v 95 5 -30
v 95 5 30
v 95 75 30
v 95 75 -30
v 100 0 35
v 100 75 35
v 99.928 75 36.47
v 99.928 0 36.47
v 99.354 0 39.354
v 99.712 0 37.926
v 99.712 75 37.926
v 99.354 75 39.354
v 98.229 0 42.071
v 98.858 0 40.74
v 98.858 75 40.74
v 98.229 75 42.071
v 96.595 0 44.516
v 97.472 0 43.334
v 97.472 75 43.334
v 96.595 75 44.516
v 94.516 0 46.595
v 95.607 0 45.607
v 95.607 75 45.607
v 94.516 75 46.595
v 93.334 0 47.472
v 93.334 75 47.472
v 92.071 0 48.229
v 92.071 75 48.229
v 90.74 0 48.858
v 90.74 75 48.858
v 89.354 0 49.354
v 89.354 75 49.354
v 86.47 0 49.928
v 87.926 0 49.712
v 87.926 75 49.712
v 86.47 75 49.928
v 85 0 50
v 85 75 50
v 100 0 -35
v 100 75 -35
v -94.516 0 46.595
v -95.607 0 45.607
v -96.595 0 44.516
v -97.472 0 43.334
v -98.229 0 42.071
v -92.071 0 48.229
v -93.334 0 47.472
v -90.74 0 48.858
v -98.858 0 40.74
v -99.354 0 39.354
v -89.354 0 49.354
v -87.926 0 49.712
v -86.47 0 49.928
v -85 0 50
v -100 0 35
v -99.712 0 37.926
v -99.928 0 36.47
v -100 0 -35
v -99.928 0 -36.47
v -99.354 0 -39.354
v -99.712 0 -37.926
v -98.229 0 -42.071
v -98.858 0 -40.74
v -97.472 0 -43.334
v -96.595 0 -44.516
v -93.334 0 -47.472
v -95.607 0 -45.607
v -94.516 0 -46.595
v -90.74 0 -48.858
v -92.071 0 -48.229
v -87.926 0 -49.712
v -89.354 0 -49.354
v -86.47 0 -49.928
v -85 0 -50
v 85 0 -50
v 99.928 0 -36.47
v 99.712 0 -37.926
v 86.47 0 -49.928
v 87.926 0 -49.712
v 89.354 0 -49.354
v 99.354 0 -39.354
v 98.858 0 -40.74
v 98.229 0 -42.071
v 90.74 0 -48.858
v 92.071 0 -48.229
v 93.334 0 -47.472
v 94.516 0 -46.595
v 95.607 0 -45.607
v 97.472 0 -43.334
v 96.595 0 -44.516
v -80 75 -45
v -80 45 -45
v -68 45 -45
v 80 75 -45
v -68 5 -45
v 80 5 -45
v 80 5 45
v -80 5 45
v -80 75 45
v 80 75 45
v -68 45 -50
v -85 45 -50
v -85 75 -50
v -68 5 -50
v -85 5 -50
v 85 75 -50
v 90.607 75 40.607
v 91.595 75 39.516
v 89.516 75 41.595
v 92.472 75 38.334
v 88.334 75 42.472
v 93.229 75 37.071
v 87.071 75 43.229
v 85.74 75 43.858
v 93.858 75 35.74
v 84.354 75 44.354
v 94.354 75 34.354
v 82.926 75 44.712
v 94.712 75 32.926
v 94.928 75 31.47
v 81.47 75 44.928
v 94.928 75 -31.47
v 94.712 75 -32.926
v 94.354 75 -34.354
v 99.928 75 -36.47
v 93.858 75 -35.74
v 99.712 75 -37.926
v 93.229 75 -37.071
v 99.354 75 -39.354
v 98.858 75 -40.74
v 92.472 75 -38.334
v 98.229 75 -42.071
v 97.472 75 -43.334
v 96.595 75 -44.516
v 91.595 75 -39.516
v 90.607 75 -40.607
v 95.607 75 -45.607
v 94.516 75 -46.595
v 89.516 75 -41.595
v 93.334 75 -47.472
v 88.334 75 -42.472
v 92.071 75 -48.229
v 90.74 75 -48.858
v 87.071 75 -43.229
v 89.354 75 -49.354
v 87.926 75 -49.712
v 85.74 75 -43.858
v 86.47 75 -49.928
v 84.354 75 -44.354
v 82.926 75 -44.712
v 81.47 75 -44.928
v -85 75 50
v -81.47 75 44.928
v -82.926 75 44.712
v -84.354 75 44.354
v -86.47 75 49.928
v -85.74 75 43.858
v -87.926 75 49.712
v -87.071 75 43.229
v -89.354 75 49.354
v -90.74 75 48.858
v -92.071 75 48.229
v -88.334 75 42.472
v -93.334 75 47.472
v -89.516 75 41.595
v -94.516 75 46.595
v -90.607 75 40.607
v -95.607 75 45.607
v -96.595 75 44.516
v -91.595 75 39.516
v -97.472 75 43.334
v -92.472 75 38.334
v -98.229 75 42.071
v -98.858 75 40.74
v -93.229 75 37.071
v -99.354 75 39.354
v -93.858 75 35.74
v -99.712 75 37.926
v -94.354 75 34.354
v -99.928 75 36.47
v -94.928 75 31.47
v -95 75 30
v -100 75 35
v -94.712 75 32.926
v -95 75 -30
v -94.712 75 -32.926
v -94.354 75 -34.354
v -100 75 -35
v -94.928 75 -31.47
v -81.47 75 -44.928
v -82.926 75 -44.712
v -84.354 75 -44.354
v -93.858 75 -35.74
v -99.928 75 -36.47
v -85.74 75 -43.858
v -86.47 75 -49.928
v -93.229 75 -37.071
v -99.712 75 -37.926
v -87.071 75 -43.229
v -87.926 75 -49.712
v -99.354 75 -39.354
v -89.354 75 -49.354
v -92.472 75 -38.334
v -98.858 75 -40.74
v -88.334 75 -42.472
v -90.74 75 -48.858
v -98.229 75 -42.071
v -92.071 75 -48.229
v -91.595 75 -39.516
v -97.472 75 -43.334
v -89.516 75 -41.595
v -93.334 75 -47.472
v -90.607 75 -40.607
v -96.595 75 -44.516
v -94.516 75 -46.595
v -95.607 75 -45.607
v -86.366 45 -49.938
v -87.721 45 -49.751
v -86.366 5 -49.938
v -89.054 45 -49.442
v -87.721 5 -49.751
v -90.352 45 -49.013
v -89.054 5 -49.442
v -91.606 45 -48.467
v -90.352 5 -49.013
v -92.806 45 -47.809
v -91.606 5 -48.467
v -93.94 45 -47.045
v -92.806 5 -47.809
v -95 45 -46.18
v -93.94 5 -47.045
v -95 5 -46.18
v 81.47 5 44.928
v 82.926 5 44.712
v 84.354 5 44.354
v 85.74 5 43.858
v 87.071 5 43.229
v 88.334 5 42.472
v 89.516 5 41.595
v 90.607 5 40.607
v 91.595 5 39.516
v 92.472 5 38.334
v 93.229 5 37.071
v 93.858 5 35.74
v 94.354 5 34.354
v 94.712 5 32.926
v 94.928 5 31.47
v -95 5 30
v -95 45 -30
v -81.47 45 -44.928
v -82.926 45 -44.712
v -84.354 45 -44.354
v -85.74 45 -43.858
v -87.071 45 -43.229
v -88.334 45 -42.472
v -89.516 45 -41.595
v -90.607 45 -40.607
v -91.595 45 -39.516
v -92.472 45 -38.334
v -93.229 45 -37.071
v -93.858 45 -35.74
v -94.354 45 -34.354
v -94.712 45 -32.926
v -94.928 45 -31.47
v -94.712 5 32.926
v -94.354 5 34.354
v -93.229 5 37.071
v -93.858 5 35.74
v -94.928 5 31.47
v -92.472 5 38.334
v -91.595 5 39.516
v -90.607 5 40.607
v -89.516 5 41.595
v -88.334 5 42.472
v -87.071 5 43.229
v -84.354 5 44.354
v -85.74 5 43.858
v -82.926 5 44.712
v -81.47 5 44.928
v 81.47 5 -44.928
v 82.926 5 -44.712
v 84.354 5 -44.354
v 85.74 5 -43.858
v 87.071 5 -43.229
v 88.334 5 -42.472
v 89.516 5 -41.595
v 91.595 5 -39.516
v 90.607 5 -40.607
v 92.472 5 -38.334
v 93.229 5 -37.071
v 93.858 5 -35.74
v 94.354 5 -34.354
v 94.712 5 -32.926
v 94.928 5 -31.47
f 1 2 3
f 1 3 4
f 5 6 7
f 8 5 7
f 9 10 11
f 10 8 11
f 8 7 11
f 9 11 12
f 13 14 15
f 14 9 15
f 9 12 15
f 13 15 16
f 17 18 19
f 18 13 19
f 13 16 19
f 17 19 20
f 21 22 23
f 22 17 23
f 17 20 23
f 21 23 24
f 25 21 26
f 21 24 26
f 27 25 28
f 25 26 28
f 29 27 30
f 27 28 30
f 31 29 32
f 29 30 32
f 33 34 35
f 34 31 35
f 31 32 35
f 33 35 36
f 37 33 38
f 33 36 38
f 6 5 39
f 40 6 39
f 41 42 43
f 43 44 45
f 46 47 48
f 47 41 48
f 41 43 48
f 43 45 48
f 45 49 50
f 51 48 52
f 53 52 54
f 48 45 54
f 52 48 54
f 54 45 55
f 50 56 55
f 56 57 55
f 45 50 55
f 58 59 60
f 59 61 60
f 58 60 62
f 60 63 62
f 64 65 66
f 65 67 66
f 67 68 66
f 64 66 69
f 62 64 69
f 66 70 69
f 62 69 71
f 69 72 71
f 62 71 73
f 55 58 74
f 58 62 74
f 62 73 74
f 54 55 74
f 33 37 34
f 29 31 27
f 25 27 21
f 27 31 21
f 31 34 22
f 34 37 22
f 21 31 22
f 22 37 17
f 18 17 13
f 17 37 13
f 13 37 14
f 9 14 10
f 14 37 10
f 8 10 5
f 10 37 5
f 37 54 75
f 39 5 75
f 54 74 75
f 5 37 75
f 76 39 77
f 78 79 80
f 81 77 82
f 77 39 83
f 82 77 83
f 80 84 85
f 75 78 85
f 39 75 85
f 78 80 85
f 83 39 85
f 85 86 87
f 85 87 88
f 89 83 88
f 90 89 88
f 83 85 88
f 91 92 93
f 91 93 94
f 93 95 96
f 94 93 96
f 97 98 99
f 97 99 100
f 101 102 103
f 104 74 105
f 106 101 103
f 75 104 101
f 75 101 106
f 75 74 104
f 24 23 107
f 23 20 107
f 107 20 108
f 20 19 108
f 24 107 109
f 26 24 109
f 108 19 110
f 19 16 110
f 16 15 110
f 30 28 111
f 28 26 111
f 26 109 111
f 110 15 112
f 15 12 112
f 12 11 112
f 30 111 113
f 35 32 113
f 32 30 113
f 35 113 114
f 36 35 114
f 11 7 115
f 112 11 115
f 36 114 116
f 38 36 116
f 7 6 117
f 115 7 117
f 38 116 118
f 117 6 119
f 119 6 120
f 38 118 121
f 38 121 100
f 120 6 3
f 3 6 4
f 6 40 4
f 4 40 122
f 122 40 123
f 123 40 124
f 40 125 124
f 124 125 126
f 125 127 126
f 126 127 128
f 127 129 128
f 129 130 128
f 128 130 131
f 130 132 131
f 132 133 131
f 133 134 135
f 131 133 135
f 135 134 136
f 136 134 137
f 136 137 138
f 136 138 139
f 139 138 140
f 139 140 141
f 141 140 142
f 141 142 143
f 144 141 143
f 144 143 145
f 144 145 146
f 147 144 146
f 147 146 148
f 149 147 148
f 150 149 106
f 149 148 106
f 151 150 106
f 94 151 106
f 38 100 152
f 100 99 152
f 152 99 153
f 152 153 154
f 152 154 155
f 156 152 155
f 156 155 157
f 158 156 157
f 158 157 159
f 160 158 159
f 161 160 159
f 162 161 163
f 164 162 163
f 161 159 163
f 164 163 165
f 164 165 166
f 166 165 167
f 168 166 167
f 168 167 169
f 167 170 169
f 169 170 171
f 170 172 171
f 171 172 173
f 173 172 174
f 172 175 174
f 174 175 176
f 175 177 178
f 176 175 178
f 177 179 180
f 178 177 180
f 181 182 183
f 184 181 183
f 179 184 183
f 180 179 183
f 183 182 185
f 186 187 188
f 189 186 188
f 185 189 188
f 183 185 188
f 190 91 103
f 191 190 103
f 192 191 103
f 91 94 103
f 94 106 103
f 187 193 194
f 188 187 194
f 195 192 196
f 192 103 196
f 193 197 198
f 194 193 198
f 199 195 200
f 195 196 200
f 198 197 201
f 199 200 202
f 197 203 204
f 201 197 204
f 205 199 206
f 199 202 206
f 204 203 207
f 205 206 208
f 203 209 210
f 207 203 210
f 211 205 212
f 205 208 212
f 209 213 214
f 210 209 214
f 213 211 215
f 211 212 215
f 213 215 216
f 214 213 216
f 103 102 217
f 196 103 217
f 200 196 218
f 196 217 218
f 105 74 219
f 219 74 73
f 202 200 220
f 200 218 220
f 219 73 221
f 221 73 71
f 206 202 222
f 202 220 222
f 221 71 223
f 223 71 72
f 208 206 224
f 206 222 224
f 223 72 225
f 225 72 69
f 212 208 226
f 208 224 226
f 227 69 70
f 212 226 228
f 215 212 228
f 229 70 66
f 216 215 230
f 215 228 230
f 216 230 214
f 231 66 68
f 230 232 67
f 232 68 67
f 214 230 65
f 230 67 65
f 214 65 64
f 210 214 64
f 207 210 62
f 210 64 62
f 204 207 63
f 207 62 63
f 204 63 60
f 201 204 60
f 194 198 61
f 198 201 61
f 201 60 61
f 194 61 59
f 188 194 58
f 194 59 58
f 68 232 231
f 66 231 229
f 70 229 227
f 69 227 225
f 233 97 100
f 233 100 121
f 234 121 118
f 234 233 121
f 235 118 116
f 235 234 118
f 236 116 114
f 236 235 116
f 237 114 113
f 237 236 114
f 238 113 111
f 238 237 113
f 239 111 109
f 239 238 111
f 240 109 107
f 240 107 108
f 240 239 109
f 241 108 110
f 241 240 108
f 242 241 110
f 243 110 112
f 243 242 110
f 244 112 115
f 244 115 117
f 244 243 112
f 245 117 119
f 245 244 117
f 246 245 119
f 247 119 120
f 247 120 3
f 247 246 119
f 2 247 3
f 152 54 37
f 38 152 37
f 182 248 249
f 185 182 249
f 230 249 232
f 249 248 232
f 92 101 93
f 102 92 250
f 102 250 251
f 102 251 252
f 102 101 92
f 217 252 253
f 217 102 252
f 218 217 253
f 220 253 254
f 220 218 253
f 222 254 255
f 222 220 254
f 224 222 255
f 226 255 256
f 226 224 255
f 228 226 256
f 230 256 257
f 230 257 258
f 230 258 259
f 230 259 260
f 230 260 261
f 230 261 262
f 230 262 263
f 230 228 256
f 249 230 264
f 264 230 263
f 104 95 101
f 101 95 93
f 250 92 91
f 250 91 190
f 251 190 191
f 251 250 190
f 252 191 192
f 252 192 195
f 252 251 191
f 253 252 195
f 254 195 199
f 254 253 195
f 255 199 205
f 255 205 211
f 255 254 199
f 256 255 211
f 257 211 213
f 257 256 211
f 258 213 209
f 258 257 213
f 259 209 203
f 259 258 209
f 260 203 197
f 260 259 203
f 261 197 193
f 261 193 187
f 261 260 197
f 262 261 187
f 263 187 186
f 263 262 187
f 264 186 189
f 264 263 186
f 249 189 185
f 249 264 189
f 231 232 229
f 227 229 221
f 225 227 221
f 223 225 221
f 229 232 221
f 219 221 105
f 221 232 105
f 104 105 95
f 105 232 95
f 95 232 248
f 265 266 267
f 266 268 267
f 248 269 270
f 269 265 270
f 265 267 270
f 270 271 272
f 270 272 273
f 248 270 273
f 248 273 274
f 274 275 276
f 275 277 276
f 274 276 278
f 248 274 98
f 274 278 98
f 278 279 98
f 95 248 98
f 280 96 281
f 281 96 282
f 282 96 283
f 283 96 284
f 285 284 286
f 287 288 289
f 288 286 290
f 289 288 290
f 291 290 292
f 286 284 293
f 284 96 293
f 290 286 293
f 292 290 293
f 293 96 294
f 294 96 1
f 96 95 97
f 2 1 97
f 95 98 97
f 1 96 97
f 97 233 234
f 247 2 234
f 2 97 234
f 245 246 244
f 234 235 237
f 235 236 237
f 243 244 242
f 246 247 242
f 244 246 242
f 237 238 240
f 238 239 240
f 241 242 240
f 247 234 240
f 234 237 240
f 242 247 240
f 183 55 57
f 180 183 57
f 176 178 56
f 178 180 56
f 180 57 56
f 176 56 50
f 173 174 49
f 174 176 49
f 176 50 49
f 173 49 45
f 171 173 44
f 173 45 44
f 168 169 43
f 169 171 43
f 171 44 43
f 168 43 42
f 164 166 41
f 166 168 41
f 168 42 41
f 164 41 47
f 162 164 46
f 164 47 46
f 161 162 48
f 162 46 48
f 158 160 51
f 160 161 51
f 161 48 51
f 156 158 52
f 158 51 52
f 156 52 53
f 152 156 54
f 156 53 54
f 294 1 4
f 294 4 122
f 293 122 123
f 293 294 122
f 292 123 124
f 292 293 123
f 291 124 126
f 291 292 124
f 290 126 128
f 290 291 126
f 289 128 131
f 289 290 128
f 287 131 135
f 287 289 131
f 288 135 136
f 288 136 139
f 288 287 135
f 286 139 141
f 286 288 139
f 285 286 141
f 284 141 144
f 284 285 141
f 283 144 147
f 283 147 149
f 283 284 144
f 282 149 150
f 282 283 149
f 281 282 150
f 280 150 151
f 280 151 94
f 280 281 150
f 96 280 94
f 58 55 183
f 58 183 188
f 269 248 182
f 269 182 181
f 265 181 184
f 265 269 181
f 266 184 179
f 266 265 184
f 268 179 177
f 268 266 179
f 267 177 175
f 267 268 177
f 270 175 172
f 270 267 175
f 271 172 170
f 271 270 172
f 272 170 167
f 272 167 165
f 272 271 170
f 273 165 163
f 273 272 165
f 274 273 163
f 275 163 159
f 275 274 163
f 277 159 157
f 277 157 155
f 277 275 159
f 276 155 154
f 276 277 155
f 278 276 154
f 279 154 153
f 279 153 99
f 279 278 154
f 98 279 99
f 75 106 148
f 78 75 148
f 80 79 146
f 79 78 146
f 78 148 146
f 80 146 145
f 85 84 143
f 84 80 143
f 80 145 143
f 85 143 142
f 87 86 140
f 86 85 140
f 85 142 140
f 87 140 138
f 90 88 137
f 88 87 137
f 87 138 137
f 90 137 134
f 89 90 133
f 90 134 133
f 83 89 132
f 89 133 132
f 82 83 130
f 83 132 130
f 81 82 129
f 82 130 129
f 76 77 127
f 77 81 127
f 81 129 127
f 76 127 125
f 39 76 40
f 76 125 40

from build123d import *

# Parameters (mm, degrees)
SKETCH1_W           = 200
SKETCH1_H           = 100
BOSS_EXTRUDE1_DEPTH = 5
SKETCH2_W           = 200
SKETCH2_H           = 100
SKETCH2_W_2         = 190
SKETCH2_H_2         = 90
BOSS_EXTRUDE2_DEPTH = 70
SKETCH3_W           = 27
SKETCH3_H           = 40
CUT_EXTRUDE1_DEPTH  = 158.003184681
FILLET1_R           = 15


with BuildPart() as part:
    # Sketch1 → Boss-Extrude1 (new body)
    with BuildSketch(Plane(origin=(0, 0, 0), x_dir=(1, 0, 0), z_dir=(0, 1, 0))):
        Rectangle(SKETCH1_W, SKETCH1_H)
    extrude(amount=BOSS_EXTRUDE1_DEPTH)

    # Sketch2 → Boss-Extrude2 (add)
    with BuildSketch(Plane(origin=(0, 5, 0), x_dir=(1, 0, 0), z_dir=(0, 1, 0))):
        Rectangle(SKETCH2_W, SKETCH2_H)
        Rectangle(SKETCH2_W_2, SKETCH2_H_2, mode=Mode.SUBTRACT)
    extrude(amount=BOSS_EXTRUDE2_DEPTH)

    # Sketch3 → Cut-Extrude1 (cut, through all)
    with BuildSketch(Plane.XY.offset(-45)):
        with Locations((-81.5, 25)):
            Rectangle(SKETCH3_W, SKETCH3_H)
    extrude(amount=-CUT_EXTRUDE1_DEPTH, mode=Mode.SUBTRACT)

    # Fillet1
    # the kernel refuses this fillet: 15 mm, written as the material it adds along each edge
    with BuildSketch(Plane(origin=(95, 5, 45), x_dir=(0, 0, -1), z_dir=(0, 1, 0)), Plane(origin=(95, 5, -45), x_dir=(-1, 0, 0), z_dir=(0, 1, 0)), Plane(origin=(-95, 5, 45), x_dir=(1, 0, 0), z_dir=(0, 1, 0))) as fillet1_piece_1:
        with BuildLine():
            CenterArc((FILLET1_R, FILLET1_R), FILLET1_R, 180, 90)
            Line((0, FILLET1_R), (0, 0))
            Line((0, 0), (FILLET1_R, 0))
        make_face()
    extrude(amount=70)
    with BuildSketch(Plane(origin=(-95, 45, -45), x_dir=(1, 0, 0), z_dir=(0, 1, 0))) as fillet1_piece_2:
        with BuildLine():
            CenterArc((FILLET1_R, -FILLET1_R), FILLET1_R, 90, 90)
            Line((0, -FILLET1_R), (0, 0))
            Line((0, 0), (FILLET1_R, 0))
        make_face()
    extrude(amount=30)
    # the kernel refuses this fillet: 15 mm, written as the material it takes off along each edge
    with BuildSketch(Plane(origin=(100, 112.5, -50), x_dir=(-1, 0, 0), z_dir=(0, -1, 0)), Plane(origin=(-100, -37.5, -50), x_dir=(1, 0, 0), z_dir=(0, 1, 0)), Plane(origin=(100, 112.5, 50), x_dir=(0, 0, -1), z_dir=(0, -1, 0))) as fillet1_2_piece_1:
        with BuildLine():
            CenterArc((FILLET1_R, -FILLET1_R), FILLET1_R, 90, 90)
            Line((0, -FILLET1_R), (0, 0))
            Line((0, 0), (FILLET1_R, 0))
        make_face()
    extrude(amount=150, mode=Mode.SUBTRACT)
    with BuildSketch(Plane(origin=(-100, -37.5, 50), x_dir=(1, 0, 0), z_dir=(0, 1, 0))) as fillet1_2_piece_2:
        with BuildLine():
            CenterArc((FILLET1_R, FILLET1_R), FILLET1_R, 180, 90)
            Line((0, FILLET1_R), (0, 0))
            Line((0, 0), (FILLET1_R, 0))
        make_face()
    extrude(amount=150, mode=Mode.SUBTRACT)


solid = part.part
